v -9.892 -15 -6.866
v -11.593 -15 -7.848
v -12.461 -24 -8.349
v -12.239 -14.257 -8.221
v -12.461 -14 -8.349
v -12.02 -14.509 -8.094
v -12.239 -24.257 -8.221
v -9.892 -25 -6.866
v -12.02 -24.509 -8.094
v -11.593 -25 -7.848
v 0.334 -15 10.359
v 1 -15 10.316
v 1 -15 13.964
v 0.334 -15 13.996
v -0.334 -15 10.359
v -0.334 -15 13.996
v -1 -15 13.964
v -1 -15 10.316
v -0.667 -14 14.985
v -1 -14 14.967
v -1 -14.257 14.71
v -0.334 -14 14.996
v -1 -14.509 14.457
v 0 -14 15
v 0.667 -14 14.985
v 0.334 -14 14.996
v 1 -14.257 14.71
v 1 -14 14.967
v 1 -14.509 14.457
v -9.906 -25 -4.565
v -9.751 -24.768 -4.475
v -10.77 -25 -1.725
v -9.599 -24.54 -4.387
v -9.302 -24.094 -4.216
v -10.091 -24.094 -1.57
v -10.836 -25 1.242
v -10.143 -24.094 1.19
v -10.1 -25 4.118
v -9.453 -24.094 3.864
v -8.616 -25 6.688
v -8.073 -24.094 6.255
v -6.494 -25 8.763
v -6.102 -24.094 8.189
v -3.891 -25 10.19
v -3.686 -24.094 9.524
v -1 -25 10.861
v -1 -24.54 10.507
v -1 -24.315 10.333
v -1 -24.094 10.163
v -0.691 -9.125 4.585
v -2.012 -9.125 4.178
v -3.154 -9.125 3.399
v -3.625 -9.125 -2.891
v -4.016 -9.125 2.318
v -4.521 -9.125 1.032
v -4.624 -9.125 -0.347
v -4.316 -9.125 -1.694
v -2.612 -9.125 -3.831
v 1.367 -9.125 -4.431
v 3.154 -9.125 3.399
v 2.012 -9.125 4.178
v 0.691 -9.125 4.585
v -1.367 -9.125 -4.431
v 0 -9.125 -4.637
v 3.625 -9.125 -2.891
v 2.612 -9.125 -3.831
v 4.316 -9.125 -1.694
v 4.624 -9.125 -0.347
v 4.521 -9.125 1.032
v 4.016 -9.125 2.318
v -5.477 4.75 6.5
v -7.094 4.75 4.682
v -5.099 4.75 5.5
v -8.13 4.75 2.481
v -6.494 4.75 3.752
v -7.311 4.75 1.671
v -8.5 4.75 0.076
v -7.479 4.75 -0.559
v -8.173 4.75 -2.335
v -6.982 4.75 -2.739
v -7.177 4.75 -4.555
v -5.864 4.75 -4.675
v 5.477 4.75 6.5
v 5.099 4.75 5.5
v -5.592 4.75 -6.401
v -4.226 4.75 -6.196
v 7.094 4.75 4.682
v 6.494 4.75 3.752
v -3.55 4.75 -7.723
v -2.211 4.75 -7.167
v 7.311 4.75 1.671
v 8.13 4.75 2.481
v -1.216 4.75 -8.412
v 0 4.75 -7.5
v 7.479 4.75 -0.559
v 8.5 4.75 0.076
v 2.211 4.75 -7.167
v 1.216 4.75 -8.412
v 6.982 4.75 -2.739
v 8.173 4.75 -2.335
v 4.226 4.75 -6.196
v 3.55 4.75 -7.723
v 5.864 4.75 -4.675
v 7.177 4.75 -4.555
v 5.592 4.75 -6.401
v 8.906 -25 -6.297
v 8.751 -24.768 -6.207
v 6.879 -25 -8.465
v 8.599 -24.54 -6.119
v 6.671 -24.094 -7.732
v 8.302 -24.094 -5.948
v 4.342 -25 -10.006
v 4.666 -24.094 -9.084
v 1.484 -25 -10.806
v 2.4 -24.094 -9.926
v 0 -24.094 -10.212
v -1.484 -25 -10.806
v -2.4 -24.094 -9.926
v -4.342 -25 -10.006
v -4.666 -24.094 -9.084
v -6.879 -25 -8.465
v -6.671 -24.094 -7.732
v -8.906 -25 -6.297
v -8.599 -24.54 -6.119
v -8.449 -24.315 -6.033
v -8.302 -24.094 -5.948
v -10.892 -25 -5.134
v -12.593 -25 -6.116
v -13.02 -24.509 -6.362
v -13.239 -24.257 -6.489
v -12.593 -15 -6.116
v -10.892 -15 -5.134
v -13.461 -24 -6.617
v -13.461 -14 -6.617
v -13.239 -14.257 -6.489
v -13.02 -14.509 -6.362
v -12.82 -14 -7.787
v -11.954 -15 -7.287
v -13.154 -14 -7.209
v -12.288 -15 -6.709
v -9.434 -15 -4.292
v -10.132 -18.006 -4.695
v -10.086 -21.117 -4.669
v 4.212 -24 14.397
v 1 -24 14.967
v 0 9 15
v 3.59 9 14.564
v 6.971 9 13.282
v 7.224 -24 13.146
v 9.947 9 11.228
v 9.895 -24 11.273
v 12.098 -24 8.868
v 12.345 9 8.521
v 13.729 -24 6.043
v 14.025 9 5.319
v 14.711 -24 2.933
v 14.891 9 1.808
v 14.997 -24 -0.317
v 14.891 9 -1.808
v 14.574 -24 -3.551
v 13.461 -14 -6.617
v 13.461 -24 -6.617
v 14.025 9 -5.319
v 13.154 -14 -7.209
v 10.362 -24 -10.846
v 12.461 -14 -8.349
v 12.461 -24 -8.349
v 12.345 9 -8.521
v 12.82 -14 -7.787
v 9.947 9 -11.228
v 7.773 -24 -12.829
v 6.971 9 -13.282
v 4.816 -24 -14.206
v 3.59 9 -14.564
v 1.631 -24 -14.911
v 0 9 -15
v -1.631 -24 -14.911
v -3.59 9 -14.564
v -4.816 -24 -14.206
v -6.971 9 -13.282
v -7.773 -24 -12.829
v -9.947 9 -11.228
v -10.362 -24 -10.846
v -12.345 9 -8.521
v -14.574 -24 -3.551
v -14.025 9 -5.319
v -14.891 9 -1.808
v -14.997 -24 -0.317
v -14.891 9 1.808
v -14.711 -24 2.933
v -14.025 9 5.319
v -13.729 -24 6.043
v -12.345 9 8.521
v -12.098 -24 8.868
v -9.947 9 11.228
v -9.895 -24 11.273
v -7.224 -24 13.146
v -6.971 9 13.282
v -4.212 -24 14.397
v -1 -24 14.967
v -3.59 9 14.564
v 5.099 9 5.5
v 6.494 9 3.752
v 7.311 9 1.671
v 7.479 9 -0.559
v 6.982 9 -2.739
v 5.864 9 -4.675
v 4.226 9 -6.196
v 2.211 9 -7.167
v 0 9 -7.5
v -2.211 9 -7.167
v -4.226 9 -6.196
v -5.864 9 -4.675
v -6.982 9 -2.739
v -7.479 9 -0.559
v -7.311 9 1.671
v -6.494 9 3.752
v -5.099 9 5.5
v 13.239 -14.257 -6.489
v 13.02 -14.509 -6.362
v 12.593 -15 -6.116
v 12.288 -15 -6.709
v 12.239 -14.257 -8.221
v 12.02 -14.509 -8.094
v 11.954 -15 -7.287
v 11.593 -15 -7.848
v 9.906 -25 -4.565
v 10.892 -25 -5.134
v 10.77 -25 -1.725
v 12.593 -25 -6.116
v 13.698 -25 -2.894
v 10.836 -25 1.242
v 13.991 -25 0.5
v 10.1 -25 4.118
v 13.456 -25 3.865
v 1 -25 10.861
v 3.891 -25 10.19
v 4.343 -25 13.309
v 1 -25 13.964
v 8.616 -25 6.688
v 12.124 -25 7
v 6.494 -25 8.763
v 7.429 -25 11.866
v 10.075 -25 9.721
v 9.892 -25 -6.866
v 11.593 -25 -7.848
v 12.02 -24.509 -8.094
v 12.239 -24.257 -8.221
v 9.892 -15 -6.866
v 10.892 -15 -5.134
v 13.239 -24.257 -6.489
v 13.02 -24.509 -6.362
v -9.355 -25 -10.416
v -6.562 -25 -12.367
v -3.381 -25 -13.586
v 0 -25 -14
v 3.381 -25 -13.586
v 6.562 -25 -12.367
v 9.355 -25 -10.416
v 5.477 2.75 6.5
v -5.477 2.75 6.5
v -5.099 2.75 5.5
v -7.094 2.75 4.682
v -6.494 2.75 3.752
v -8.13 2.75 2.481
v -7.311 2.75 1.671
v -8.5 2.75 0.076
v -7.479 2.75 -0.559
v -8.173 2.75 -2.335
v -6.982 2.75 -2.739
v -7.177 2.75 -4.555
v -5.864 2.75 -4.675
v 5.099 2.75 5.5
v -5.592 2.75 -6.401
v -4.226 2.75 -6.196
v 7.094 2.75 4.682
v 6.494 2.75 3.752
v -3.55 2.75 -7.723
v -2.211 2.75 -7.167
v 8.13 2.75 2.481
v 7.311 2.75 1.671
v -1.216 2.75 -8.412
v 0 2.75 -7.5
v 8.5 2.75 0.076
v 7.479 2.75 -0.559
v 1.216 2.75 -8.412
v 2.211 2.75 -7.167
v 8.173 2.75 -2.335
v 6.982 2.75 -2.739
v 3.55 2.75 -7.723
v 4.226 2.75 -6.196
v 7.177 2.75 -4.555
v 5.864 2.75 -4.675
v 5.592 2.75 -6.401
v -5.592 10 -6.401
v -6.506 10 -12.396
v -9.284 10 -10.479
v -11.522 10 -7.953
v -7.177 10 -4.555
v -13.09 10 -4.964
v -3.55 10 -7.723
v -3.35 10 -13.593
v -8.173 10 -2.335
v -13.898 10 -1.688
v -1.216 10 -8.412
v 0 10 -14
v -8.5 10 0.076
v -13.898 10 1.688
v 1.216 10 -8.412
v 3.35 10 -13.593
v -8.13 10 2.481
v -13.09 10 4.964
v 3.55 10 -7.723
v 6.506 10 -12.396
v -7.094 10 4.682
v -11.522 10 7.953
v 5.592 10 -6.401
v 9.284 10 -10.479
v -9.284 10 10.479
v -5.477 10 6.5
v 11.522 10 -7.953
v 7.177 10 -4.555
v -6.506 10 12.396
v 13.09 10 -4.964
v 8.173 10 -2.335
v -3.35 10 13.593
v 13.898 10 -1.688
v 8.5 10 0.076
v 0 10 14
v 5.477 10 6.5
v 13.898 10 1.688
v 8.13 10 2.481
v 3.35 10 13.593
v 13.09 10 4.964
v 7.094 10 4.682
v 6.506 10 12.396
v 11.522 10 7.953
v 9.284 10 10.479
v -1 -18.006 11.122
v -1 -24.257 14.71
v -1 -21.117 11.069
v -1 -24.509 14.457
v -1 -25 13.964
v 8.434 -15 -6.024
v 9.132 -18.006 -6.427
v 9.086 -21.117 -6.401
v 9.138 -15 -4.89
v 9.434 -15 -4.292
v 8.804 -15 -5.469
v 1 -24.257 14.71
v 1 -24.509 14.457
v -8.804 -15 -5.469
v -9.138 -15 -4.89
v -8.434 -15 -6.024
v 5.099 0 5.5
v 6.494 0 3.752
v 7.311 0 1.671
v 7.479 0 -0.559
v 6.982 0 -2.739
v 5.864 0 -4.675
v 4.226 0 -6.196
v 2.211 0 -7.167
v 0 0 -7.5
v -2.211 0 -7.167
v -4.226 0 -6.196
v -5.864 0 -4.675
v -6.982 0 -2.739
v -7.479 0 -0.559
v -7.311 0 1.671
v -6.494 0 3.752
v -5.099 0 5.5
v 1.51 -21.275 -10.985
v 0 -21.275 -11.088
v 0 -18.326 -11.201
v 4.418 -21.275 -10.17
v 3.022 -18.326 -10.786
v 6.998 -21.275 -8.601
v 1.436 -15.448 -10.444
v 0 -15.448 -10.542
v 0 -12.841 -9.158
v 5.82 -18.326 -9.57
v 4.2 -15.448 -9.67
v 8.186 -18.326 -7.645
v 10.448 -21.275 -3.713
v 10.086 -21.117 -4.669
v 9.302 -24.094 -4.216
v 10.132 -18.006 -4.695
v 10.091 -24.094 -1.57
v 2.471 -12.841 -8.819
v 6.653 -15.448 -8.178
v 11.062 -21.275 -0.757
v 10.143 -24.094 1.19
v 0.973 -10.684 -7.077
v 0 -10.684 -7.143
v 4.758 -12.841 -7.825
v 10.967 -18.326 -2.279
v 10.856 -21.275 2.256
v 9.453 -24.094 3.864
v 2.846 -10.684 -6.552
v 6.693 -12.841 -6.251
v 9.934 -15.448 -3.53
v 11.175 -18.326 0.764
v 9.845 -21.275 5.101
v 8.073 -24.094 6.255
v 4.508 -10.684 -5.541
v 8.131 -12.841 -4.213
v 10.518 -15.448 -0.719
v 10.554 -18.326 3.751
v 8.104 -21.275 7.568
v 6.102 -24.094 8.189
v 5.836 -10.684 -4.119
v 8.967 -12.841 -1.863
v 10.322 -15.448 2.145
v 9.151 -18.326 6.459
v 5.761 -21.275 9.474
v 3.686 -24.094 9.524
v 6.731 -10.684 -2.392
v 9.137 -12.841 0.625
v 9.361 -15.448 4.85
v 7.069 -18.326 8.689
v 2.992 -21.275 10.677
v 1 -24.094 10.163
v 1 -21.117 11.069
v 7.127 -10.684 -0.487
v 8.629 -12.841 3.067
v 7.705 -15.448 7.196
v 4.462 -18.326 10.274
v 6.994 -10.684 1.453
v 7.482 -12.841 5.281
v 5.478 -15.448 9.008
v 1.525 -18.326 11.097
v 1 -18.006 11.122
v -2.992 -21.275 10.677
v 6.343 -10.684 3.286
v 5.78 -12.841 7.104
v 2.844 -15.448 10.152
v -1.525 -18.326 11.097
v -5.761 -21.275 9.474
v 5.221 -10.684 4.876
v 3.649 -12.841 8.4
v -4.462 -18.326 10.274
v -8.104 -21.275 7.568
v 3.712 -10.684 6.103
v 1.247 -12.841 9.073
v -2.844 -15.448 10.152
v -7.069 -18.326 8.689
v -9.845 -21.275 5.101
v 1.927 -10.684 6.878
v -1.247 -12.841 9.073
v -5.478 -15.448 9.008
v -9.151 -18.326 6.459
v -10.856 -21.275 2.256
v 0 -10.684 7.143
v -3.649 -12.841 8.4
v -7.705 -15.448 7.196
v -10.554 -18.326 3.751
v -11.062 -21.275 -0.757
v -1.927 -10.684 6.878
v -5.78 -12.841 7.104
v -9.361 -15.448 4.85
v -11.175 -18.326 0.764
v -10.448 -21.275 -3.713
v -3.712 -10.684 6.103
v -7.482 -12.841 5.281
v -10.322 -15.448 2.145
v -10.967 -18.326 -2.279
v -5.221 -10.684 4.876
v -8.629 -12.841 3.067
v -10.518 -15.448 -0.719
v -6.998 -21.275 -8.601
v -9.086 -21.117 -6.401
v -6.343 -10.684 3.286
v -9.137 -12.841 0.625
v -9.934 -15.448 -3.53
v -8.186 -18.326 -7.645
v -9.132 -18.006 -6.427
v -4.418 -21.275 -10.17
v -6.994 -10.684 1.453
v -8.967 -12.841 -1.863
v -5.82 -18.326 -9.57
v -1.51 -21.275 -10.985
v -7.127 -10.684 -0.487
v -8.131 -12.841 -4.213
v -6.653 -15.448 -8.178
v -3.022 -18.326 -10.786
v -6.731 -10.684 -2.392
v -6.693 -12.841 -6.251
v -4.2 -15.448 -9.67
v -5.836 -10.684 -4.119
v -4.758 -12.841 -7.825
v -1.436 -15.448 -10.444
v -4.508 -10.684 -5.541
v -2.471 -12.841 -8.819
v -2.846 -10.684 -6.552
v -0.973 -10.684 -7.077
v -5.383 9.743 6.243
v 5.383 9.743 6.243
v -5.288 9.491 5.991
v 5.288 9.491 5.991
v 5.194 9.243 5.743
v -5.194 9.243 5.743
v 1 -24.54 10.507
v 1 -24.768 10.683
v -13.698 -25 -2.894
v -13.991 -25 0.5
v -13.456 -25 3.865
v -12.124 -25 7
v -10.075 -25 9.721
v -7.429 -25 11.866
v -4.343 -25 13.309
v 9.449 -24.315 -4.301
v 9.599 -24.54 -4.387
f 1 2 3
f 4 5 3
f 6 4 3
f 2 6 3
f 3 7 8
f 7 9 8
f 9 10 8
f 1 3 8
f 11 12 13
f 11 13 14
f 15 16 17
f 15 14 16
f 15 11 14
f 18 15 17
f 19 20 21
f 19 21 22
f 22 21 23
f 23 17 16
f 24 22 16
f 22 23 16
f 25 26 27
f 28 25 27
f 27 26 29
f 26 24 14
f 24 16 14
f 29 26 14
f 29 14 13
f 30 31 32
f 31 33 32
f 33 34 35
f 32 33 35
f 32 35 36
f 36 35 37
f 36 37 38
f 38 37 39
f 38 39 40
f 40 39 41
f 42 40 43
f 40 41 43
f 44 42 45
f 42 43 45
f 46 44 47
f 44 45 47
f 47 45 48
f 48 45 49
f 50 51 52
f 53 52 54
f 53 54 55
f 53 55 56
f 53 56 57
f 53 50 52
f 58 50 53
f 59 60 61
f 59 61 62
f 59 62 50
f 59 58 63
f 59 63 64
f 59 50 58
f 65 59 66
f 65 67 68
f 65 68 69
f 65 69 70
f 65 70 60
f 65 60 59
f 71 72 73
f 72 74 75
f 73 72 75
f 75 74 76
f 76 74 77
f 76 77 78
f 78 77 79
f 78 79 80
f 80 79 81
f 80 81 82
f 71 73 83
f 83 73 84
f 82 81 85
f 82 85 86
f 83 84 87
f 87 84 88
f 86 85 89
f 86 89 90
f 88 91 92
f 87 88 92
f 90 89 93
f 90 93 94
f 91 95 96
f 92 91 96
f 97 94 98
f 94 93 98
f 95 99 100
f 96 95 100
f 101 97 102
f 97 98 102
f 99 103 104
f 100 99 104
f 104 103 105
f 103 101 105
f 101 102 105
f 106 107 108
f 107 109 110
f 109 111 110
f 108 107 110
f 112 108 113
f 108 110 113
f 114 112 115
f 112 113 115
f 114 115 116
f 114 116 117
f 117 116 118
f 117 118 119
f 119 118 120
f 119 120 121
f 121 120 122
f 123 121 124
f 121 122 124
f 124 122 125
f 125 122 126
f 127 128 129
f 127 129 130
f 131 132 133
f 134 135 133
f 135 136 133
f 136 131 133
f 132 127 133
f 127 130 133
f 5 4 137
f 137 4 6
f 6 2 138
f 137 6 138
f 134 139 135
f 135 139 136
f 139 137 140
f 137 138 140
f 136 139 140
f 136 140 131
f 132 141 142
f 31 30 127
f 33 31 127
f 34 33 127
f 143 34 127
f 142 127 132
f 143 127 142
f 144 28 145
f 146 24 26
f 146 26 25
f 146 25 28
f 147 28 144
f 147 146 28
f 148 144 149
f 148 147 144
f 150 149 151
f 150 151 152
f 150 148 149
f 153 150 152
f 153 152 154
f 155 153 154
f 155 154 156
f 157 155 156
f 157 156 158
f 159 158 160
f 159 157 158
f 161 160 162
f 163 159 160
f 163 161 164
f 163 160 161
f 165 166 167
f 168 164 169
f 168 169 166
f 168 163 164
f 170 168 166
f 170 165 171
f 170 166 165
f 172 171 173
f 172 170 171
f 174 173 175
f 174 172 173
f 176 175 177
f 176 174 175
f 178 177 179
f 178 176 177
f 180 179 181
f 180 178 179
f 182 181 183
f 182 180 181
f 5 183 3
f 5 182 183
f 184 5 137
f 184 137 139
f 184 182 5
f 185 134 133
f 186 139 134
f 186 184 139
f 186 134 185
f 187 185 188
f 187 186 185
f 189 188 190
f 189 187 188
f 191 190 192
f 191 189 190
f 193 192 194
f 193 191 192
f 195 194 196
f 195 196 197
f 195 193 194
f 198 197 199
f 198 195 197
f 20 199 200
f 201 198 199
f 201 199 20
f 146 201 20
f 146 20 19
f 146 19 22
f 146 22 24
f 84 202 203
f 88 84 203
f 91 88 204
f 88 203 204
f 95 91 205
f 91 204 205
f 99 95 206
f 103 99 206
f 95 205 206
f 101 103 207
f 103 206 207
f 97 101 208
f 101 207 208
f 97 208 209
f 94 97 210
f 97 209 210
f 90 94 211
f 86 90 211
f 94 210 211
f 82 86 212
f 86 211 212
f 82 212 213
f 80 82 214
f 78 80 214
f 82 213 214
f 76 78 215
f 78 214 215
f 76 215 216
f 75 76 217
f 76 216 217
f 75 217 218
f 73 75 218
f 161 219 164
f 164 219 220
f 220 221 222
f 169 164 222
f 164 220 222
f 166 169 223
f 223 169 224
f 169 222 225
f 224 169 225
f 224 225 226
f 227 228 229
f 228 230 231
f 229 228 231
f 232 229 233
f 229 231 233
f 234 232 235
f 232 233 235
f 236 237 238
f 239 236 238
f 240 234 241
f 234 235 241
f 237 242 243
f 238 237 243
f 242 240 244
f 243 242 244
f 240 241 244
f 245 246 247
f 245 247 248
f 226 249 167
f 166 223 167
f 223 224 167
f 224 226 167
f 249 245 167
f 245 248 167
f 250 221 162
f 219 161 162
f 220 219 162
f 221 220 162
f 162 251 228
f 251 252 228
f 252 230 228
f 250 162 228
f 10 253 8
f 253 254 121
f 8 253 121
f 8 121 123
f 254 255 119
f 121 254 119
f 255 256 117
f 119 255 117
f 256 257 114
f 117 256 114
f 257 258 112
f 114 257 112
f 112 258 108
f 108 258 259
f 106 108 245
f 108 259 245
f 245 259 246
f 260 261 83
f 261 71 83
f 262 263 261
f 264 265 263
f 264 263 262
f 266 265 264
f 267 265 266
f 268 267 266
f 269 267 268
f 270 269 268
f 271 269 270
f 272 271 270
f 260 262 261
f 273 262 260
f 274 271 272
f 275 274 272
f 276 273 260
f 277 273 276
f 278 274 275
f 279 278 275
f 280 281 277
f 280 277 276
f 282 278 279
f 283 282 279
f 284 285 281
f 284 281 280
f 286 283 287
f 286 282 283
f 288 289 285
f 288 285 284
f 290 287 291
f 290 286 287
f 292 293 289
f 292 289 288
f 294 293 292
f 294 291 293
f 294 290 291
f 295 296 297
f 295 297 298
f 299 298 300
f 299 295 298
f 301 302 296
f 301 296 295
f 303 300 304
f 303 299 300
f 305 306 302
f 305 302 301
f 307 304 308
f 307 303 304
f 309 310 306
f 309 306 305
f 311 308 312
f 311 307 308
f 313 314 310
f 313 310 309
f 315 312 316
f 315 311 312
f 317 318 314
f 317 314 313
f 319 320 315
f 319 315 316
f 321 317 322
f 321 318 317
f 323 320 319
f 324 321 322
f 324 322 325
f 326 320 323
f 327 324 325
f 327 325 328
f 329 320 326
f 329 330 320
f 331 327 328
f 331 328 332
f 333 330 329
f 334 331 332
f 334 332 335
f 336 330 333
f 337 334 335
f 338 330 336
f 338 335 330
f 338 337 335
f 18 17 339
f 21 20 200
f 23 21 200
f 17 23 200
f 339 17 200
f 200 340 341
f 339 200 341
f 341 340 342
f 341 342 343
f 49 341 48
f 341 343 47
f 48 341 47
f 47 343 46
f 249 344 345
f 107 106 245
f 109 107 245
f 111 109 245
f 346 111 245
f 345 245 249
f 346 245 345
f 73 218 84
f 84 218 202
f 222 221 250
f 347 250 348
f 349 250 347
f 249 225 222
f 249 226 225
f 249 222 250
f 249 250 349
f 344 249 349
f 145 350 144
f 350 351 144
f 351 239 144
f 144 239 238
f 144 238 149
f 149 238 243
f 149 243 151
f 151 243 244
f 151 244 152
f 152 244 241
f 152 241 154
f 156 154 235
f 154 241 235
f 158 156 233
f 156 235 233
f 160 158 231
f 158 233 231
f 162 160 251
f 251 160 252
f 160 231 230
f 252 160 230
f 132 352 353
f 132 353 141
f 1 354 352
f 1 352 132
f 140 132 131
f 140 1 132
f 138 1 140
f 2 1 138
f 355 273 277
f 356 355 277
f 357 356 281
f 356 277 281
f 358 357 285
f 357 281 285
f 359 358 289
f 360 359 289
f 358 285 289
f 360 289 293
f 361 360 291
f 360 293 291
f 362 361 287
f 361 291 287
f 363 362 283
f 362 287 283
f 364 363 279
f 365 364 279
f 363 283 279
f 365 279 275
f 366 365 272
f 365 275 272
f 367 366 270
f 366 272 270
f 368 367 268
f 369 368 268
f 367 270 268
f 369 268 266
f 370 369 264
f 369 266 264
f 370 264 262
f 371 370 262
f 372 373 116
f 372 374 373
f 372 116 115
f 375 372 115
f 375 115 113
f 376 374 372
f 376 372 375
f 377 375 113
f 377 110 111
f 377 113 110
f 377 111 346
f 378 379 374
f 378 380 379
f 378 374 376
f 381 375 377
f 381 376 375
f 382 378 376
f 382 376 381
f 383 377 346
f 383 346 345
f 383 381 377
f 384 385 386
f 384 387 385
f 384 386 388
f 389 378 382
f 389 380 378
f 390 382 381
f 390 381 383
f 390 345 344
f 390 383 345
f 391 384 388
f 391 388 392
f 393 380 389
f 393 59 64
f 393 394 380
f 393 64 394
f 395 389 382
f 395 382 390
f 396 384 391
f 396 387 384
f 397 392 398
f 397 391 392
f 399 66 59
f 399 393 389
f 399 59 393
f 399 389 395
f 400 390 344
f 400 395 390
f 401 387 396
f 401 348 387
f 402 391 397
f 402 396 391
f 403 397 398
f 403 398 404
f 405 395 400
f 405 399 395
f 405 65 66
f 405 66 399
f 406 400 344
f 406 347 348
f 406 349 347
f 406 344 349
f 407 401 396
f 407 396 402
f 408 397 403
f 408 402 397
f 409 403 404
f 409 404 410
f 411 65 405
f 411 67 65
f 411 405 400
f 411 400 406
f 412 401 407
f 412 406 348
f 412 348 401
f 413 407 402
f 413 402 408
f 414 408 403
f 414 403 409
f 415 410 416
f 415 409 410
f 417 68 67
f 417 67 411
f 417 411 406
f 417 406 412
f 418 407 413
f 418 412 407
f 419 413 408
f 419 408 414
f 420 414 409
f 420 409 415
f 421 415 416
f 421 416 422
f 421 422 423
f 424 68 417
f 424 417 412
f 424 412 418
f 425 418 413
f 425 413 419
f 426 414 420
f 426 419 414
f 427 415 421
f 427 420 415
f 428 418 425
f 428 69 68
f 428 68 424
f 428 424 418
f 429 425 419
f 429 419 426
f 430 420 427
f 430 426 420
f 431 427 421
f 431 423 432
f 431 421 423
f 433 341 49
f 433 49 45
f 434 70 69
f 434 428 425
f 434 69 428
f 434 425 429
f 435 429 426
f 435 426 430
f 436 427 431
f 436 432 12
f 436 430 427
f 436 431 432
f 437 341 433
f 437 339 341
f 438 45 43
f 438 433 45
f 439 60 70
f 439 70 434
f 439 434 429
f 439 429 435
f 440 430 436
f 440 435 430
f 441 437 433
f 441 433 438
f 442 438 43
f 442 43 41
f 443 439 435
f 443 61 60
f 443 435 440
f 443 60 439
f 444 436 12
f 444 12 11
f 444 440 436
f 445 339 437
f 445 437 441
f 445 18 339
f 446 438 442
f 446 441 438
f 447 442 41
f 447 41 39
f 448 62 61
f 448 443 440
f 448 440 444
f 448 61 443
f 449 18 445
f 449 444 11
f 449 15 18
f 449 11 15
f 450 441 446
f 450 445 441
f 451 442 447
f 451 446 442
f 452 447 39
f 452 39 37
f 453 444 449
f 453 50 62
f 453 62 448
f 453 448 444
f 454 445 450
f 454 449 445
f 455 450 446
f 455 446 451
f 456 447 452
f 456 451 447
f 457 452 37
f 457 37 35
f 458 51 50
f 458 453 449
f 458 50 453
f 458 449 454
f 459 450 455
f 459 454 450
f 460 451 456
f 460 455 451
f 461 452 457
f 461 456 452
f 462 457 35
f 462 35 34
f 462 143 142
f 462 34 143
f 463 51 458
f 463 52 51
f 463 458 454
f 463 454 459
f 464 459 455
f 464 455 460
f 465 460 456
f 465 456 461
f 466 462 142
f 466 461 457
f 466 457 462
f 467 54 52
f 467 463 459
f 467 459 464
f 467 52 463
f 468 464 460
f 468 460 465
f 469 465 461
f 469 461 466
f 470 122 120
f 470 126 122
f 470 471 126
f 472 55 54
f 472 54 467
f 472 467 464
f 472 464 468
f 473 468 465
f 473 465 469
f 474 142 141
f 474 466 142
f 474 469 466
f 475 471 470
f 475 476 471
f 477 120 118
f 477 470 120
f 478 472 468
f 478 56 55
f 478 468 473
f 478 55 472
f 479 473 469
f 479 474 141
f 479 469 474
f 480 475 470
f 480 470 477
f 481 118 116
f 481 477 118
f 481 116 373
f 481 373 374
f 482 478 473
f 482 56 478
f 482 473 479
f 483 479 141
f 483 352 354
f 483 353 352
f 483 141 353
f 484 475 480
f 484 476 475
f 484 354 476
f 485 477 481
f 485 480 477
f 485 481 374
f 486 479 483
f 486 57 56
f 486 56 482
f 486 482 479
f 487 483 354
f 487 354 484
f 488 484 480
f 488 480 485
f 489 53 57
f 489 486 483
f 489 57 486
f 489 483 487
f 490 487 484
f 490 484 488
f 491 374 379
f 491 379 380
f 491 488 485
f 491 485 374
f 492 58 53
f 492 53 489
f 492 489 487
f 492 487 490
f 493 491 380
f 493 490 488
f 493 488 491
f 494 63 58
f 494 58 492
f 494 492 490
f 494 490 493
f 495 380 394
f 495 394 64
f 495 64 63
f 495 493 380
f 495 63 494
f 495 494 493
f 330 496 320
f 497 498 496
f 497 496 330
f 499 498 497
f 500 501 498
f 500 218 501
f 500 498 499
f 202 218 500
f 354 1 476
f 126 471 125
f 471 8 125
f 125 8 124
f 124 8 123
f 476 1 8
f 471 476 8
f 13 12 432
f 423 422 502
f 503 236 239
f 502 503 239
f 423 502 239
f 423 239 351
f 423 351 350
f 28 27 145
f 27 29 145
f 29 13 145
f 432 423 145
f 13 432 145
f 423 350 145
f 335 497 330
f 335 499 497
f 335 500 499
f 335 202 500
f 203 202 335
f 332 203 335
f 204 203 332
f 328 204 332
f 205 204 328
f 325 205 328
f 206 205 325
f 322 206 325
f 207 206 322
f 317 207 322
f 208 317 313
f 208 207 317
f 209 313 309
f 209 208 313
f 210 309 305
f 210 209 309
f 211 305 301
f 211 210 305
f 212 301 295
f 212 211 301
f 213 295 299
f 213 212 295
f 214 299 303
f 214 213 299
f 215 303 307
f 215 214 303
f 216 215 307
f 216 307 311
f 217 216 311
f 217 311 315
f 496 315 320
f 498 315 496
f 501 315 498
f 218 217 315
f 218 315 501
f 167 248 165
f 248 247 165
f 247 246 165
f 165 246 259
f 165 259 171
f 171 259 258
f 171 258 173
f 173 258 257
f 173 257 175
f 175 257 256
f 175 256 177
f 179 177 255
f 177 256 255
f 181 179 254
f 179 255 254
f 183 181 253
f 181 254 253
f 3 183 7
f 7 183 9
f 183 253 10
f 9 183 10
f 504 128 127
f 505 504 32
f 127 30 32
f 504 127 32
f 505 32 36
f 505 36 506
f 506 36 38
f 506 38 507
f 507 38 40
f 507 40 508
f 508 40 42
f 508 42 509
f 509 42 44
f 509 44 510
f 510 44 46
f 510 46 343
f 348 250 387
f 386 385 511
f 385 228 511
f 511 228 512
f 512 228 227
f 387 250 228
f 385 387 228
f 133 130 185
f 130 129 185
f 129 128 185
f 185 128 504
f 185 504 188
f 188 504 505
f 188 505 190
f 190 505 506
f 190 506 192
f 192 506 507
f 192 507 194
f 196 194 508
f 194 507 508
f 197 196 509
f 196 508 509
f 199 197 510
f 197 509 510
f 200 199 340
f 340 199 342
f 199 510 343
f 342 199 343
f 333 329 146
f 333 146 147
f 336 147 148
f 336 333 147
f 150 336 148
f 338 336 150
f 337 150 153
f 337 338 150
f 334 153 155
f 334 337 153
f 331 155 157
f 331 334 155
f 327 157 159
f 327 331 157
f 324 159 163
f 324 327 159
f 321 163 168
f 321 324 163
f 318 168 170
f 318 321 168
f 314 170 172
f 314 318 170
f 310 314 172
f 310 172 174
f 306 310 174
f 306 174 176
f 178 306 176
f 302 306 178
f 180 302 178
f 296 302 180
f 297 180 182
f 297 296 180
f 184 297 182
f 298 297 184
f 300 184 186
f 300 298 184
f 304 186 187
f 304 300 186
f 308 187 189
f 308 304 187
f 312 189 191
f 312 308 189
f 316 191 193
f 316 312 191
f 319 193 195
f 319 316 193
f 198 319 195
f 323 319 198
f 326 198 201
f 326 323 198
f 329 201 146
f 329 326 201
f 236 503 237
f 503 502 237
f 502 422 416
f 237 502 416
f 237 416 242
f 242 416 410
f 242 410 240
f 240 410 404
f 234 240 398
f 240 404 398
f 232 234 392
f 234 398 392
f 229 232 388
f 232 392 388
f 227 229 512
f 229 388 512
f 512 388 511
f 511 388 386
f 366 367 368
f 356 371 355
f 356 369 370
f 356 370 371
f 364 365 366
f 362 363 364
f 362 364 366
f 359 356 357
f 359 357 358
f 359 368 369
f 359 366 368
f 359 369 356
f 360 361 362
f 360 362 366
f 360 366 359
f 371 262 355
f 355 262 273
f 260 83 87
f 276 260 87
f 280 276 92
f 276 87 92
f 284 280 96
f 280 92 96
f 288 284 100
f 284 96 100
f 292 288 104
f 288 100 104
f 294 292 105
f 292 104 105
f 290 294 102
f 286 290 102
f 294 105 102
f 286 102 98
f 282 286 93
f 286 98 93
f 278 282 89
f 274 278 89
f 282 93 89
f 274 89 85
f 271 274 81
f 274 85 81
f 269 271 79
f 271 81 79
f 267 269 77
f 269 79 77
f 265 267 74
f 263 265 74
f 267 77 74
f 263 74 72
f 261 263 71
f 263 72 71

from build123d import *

# Parameters (mm, degrees)
SKETCH1_R           = 15
BOSS_EXTRUDE2_DEPTH = 25
CUT_EXTRUDE1_DEPTH  = 10
SKETCH4_R           = 15
CUT_EXTRUDE2_DEPTH  = 15
CHAMFER1_SIZE       = 1
CHAMFER3_SIZE       = 1
CUT_EXTRUDE4_DEPTH  = 10
CUT_EXTRUDE5_DEPTH  = 1
CHAMFER5_SIZE       = 1


with BuildPart() as part:
    # Sketch1 → Boss-Extrude2 (new, symmetric)
    with BuildSketch(Plane(origin=(0, 0, 0), x_dir=(1, 0, 0), z_dir=(0, 1, 0))):
        with Locations(Location((0, 0, 0), (0, 0, 270))):
            Circle(SKETCH1_R)
    extrude(amount=BOSS_EXTRUDE2_DEPTH, both=True)

    # Sketch2 → Cut-Revolve1 (revolve, cut)
    with BuildSketch(Plane(origin=(0, 0, 0), x_dir=(0, 0, -1), z_dir=(1, 0, 0))):
        with BuildLine():
            Line((0, -9.125), (0, -25))
            Line((0, -25), (9.742785793, -25))
            ThreePointArc((9.742785793, -25), (10.709672947, -15.930380229), (4.636809248, -9.125))
            Line((4.636809248, -9.125), (0, -9.125))
        make_face()
    revolve(axis=Axis((0, -9.125, 0), (0, -1, 0)), mode=Mode.SUBTRACT)

    # Sketch3 → Cut-Extrude1 (cut)
    with BuildSketch(Plane(origin=(0, -25, 0), x_dir=(-1, 0, 0), z_dir=(0, -1, 0))):
        Polygon((19.052558883, 11), (18.552558883, 11.866025404), (9.892304845, 6.866025404), (0, 1.154700538), (-9.892304845, 6.866025404), (-18.552558883, 11.866025404), (-19.052558883, 11), (-19.552558883, 10.133974596), (-10.892304845, 5.133974596), (-1, -0.577350269), (-1, -12), (-1, -22), (0, -22), (1, -22), (1, -12), (1, -0.577350269), (10.892304845, 5.133974596), (19.552558883, 10.133974596), align=None)
    extrude(amount=-CUT_EXTRUDE1_DEPTH, mode=Mode.SUBTRACT)

    # Sketch4 → Cut-Extrude2 (cut)
    with BuildSketch(Plane(origin=(0, 25, 0), x_dir=(1, 0, 0), z_dir=(0, 1, 0))):
        with Locations(Location((0, 0, 0), (0, 0, 270))):
            Circle(SKETCH4_R)
    extrude(amount=-CUT_EXTRUDE2_DEPTH, mode=Mode.SUBTRACT)

    # Chamfer1
    chamfer1_edges = [part.edges().sort_by_distance(p)[0] for p in [
        (0, -25, -15),
        (-12.990381057, -25, 7.5),
        (12.990381057, -25, 7.5),
    ]]
    chamfer(chamfer1_edges, length=CHAMFER1_SIZE)

    # Chamfer3
    chamfer3_edges = [part.edges().sort_by_distance(p)[0] for p in [
        (12.990381057, -15, -7.5),
        (0.500278319, -15, 14.991655066),
        (-12.990381057, -15, -7.5),
    ]]
    chamfer(chamfer3_edges, length=CHAMFER3_SIZE)

    # Chamfer4: read off the stored shape, not the designer's step
    # Chamfer4 outline → Chamfer4 (revolve, cut)
    with BuildSketch(Plane.XY):
        Polygon((10.907310457, -25), (10.212304822, -24.094251023), (0, -24.094251023), (0, -25), align=None)
    revolve(axis=Axis((0, 0, 0), (0, 1, 0)), mode=Mode.SUBTRACT)

    # Sketch5 → Cut-Extrude4 (cut)
    with BuildSketch(Plane(origin=(0, 10, 0), x_dir=(1, 0, 0), z_dir=(0, 1, 0))):
        with BuildLine():
            Line((-5.099019514, -5.5), (5.099019514, -5.5))
            ThreePointArc((5.099019514, -5.5), (0, 7.5), (-5.099019514, -5.5))
        make_face()
    extrude(amount=-CUT_EXTRUDE4_DEPTH, mode=Mode.SUBTRACT)

    # Sketch7 → Cut-Extrude5 (cut, symmetric)
    with BuildSketch(Plane(origin=(0, 3.75, 0), x_dir=(1, 0, 0), z_dir=(0, 1, 0))):
        with BuildLine():
            Line((-5.477225575, -6.5), (5.477225575, -6.5))
            ThreePointArc((5.477225575, -6.5), (0, 8.5), (-5.477225575, -6.5))
        make_face()
    extrude(amount=CUT_EXTRUDE5_DEPTH, both=True, mode=Mode.SUBTRACT)

    # Chamfer5
    chamfer5_edges = [part.edges().sort_by_distance(p)[0] for p in [
        (0, 10, -7.5),
        (0, 10, 5.5),
        (0, 10, -15),
    ]]
    chamfer(chamfer5_edges, length=CHAMFER5_SIZE)


solid = part.part
